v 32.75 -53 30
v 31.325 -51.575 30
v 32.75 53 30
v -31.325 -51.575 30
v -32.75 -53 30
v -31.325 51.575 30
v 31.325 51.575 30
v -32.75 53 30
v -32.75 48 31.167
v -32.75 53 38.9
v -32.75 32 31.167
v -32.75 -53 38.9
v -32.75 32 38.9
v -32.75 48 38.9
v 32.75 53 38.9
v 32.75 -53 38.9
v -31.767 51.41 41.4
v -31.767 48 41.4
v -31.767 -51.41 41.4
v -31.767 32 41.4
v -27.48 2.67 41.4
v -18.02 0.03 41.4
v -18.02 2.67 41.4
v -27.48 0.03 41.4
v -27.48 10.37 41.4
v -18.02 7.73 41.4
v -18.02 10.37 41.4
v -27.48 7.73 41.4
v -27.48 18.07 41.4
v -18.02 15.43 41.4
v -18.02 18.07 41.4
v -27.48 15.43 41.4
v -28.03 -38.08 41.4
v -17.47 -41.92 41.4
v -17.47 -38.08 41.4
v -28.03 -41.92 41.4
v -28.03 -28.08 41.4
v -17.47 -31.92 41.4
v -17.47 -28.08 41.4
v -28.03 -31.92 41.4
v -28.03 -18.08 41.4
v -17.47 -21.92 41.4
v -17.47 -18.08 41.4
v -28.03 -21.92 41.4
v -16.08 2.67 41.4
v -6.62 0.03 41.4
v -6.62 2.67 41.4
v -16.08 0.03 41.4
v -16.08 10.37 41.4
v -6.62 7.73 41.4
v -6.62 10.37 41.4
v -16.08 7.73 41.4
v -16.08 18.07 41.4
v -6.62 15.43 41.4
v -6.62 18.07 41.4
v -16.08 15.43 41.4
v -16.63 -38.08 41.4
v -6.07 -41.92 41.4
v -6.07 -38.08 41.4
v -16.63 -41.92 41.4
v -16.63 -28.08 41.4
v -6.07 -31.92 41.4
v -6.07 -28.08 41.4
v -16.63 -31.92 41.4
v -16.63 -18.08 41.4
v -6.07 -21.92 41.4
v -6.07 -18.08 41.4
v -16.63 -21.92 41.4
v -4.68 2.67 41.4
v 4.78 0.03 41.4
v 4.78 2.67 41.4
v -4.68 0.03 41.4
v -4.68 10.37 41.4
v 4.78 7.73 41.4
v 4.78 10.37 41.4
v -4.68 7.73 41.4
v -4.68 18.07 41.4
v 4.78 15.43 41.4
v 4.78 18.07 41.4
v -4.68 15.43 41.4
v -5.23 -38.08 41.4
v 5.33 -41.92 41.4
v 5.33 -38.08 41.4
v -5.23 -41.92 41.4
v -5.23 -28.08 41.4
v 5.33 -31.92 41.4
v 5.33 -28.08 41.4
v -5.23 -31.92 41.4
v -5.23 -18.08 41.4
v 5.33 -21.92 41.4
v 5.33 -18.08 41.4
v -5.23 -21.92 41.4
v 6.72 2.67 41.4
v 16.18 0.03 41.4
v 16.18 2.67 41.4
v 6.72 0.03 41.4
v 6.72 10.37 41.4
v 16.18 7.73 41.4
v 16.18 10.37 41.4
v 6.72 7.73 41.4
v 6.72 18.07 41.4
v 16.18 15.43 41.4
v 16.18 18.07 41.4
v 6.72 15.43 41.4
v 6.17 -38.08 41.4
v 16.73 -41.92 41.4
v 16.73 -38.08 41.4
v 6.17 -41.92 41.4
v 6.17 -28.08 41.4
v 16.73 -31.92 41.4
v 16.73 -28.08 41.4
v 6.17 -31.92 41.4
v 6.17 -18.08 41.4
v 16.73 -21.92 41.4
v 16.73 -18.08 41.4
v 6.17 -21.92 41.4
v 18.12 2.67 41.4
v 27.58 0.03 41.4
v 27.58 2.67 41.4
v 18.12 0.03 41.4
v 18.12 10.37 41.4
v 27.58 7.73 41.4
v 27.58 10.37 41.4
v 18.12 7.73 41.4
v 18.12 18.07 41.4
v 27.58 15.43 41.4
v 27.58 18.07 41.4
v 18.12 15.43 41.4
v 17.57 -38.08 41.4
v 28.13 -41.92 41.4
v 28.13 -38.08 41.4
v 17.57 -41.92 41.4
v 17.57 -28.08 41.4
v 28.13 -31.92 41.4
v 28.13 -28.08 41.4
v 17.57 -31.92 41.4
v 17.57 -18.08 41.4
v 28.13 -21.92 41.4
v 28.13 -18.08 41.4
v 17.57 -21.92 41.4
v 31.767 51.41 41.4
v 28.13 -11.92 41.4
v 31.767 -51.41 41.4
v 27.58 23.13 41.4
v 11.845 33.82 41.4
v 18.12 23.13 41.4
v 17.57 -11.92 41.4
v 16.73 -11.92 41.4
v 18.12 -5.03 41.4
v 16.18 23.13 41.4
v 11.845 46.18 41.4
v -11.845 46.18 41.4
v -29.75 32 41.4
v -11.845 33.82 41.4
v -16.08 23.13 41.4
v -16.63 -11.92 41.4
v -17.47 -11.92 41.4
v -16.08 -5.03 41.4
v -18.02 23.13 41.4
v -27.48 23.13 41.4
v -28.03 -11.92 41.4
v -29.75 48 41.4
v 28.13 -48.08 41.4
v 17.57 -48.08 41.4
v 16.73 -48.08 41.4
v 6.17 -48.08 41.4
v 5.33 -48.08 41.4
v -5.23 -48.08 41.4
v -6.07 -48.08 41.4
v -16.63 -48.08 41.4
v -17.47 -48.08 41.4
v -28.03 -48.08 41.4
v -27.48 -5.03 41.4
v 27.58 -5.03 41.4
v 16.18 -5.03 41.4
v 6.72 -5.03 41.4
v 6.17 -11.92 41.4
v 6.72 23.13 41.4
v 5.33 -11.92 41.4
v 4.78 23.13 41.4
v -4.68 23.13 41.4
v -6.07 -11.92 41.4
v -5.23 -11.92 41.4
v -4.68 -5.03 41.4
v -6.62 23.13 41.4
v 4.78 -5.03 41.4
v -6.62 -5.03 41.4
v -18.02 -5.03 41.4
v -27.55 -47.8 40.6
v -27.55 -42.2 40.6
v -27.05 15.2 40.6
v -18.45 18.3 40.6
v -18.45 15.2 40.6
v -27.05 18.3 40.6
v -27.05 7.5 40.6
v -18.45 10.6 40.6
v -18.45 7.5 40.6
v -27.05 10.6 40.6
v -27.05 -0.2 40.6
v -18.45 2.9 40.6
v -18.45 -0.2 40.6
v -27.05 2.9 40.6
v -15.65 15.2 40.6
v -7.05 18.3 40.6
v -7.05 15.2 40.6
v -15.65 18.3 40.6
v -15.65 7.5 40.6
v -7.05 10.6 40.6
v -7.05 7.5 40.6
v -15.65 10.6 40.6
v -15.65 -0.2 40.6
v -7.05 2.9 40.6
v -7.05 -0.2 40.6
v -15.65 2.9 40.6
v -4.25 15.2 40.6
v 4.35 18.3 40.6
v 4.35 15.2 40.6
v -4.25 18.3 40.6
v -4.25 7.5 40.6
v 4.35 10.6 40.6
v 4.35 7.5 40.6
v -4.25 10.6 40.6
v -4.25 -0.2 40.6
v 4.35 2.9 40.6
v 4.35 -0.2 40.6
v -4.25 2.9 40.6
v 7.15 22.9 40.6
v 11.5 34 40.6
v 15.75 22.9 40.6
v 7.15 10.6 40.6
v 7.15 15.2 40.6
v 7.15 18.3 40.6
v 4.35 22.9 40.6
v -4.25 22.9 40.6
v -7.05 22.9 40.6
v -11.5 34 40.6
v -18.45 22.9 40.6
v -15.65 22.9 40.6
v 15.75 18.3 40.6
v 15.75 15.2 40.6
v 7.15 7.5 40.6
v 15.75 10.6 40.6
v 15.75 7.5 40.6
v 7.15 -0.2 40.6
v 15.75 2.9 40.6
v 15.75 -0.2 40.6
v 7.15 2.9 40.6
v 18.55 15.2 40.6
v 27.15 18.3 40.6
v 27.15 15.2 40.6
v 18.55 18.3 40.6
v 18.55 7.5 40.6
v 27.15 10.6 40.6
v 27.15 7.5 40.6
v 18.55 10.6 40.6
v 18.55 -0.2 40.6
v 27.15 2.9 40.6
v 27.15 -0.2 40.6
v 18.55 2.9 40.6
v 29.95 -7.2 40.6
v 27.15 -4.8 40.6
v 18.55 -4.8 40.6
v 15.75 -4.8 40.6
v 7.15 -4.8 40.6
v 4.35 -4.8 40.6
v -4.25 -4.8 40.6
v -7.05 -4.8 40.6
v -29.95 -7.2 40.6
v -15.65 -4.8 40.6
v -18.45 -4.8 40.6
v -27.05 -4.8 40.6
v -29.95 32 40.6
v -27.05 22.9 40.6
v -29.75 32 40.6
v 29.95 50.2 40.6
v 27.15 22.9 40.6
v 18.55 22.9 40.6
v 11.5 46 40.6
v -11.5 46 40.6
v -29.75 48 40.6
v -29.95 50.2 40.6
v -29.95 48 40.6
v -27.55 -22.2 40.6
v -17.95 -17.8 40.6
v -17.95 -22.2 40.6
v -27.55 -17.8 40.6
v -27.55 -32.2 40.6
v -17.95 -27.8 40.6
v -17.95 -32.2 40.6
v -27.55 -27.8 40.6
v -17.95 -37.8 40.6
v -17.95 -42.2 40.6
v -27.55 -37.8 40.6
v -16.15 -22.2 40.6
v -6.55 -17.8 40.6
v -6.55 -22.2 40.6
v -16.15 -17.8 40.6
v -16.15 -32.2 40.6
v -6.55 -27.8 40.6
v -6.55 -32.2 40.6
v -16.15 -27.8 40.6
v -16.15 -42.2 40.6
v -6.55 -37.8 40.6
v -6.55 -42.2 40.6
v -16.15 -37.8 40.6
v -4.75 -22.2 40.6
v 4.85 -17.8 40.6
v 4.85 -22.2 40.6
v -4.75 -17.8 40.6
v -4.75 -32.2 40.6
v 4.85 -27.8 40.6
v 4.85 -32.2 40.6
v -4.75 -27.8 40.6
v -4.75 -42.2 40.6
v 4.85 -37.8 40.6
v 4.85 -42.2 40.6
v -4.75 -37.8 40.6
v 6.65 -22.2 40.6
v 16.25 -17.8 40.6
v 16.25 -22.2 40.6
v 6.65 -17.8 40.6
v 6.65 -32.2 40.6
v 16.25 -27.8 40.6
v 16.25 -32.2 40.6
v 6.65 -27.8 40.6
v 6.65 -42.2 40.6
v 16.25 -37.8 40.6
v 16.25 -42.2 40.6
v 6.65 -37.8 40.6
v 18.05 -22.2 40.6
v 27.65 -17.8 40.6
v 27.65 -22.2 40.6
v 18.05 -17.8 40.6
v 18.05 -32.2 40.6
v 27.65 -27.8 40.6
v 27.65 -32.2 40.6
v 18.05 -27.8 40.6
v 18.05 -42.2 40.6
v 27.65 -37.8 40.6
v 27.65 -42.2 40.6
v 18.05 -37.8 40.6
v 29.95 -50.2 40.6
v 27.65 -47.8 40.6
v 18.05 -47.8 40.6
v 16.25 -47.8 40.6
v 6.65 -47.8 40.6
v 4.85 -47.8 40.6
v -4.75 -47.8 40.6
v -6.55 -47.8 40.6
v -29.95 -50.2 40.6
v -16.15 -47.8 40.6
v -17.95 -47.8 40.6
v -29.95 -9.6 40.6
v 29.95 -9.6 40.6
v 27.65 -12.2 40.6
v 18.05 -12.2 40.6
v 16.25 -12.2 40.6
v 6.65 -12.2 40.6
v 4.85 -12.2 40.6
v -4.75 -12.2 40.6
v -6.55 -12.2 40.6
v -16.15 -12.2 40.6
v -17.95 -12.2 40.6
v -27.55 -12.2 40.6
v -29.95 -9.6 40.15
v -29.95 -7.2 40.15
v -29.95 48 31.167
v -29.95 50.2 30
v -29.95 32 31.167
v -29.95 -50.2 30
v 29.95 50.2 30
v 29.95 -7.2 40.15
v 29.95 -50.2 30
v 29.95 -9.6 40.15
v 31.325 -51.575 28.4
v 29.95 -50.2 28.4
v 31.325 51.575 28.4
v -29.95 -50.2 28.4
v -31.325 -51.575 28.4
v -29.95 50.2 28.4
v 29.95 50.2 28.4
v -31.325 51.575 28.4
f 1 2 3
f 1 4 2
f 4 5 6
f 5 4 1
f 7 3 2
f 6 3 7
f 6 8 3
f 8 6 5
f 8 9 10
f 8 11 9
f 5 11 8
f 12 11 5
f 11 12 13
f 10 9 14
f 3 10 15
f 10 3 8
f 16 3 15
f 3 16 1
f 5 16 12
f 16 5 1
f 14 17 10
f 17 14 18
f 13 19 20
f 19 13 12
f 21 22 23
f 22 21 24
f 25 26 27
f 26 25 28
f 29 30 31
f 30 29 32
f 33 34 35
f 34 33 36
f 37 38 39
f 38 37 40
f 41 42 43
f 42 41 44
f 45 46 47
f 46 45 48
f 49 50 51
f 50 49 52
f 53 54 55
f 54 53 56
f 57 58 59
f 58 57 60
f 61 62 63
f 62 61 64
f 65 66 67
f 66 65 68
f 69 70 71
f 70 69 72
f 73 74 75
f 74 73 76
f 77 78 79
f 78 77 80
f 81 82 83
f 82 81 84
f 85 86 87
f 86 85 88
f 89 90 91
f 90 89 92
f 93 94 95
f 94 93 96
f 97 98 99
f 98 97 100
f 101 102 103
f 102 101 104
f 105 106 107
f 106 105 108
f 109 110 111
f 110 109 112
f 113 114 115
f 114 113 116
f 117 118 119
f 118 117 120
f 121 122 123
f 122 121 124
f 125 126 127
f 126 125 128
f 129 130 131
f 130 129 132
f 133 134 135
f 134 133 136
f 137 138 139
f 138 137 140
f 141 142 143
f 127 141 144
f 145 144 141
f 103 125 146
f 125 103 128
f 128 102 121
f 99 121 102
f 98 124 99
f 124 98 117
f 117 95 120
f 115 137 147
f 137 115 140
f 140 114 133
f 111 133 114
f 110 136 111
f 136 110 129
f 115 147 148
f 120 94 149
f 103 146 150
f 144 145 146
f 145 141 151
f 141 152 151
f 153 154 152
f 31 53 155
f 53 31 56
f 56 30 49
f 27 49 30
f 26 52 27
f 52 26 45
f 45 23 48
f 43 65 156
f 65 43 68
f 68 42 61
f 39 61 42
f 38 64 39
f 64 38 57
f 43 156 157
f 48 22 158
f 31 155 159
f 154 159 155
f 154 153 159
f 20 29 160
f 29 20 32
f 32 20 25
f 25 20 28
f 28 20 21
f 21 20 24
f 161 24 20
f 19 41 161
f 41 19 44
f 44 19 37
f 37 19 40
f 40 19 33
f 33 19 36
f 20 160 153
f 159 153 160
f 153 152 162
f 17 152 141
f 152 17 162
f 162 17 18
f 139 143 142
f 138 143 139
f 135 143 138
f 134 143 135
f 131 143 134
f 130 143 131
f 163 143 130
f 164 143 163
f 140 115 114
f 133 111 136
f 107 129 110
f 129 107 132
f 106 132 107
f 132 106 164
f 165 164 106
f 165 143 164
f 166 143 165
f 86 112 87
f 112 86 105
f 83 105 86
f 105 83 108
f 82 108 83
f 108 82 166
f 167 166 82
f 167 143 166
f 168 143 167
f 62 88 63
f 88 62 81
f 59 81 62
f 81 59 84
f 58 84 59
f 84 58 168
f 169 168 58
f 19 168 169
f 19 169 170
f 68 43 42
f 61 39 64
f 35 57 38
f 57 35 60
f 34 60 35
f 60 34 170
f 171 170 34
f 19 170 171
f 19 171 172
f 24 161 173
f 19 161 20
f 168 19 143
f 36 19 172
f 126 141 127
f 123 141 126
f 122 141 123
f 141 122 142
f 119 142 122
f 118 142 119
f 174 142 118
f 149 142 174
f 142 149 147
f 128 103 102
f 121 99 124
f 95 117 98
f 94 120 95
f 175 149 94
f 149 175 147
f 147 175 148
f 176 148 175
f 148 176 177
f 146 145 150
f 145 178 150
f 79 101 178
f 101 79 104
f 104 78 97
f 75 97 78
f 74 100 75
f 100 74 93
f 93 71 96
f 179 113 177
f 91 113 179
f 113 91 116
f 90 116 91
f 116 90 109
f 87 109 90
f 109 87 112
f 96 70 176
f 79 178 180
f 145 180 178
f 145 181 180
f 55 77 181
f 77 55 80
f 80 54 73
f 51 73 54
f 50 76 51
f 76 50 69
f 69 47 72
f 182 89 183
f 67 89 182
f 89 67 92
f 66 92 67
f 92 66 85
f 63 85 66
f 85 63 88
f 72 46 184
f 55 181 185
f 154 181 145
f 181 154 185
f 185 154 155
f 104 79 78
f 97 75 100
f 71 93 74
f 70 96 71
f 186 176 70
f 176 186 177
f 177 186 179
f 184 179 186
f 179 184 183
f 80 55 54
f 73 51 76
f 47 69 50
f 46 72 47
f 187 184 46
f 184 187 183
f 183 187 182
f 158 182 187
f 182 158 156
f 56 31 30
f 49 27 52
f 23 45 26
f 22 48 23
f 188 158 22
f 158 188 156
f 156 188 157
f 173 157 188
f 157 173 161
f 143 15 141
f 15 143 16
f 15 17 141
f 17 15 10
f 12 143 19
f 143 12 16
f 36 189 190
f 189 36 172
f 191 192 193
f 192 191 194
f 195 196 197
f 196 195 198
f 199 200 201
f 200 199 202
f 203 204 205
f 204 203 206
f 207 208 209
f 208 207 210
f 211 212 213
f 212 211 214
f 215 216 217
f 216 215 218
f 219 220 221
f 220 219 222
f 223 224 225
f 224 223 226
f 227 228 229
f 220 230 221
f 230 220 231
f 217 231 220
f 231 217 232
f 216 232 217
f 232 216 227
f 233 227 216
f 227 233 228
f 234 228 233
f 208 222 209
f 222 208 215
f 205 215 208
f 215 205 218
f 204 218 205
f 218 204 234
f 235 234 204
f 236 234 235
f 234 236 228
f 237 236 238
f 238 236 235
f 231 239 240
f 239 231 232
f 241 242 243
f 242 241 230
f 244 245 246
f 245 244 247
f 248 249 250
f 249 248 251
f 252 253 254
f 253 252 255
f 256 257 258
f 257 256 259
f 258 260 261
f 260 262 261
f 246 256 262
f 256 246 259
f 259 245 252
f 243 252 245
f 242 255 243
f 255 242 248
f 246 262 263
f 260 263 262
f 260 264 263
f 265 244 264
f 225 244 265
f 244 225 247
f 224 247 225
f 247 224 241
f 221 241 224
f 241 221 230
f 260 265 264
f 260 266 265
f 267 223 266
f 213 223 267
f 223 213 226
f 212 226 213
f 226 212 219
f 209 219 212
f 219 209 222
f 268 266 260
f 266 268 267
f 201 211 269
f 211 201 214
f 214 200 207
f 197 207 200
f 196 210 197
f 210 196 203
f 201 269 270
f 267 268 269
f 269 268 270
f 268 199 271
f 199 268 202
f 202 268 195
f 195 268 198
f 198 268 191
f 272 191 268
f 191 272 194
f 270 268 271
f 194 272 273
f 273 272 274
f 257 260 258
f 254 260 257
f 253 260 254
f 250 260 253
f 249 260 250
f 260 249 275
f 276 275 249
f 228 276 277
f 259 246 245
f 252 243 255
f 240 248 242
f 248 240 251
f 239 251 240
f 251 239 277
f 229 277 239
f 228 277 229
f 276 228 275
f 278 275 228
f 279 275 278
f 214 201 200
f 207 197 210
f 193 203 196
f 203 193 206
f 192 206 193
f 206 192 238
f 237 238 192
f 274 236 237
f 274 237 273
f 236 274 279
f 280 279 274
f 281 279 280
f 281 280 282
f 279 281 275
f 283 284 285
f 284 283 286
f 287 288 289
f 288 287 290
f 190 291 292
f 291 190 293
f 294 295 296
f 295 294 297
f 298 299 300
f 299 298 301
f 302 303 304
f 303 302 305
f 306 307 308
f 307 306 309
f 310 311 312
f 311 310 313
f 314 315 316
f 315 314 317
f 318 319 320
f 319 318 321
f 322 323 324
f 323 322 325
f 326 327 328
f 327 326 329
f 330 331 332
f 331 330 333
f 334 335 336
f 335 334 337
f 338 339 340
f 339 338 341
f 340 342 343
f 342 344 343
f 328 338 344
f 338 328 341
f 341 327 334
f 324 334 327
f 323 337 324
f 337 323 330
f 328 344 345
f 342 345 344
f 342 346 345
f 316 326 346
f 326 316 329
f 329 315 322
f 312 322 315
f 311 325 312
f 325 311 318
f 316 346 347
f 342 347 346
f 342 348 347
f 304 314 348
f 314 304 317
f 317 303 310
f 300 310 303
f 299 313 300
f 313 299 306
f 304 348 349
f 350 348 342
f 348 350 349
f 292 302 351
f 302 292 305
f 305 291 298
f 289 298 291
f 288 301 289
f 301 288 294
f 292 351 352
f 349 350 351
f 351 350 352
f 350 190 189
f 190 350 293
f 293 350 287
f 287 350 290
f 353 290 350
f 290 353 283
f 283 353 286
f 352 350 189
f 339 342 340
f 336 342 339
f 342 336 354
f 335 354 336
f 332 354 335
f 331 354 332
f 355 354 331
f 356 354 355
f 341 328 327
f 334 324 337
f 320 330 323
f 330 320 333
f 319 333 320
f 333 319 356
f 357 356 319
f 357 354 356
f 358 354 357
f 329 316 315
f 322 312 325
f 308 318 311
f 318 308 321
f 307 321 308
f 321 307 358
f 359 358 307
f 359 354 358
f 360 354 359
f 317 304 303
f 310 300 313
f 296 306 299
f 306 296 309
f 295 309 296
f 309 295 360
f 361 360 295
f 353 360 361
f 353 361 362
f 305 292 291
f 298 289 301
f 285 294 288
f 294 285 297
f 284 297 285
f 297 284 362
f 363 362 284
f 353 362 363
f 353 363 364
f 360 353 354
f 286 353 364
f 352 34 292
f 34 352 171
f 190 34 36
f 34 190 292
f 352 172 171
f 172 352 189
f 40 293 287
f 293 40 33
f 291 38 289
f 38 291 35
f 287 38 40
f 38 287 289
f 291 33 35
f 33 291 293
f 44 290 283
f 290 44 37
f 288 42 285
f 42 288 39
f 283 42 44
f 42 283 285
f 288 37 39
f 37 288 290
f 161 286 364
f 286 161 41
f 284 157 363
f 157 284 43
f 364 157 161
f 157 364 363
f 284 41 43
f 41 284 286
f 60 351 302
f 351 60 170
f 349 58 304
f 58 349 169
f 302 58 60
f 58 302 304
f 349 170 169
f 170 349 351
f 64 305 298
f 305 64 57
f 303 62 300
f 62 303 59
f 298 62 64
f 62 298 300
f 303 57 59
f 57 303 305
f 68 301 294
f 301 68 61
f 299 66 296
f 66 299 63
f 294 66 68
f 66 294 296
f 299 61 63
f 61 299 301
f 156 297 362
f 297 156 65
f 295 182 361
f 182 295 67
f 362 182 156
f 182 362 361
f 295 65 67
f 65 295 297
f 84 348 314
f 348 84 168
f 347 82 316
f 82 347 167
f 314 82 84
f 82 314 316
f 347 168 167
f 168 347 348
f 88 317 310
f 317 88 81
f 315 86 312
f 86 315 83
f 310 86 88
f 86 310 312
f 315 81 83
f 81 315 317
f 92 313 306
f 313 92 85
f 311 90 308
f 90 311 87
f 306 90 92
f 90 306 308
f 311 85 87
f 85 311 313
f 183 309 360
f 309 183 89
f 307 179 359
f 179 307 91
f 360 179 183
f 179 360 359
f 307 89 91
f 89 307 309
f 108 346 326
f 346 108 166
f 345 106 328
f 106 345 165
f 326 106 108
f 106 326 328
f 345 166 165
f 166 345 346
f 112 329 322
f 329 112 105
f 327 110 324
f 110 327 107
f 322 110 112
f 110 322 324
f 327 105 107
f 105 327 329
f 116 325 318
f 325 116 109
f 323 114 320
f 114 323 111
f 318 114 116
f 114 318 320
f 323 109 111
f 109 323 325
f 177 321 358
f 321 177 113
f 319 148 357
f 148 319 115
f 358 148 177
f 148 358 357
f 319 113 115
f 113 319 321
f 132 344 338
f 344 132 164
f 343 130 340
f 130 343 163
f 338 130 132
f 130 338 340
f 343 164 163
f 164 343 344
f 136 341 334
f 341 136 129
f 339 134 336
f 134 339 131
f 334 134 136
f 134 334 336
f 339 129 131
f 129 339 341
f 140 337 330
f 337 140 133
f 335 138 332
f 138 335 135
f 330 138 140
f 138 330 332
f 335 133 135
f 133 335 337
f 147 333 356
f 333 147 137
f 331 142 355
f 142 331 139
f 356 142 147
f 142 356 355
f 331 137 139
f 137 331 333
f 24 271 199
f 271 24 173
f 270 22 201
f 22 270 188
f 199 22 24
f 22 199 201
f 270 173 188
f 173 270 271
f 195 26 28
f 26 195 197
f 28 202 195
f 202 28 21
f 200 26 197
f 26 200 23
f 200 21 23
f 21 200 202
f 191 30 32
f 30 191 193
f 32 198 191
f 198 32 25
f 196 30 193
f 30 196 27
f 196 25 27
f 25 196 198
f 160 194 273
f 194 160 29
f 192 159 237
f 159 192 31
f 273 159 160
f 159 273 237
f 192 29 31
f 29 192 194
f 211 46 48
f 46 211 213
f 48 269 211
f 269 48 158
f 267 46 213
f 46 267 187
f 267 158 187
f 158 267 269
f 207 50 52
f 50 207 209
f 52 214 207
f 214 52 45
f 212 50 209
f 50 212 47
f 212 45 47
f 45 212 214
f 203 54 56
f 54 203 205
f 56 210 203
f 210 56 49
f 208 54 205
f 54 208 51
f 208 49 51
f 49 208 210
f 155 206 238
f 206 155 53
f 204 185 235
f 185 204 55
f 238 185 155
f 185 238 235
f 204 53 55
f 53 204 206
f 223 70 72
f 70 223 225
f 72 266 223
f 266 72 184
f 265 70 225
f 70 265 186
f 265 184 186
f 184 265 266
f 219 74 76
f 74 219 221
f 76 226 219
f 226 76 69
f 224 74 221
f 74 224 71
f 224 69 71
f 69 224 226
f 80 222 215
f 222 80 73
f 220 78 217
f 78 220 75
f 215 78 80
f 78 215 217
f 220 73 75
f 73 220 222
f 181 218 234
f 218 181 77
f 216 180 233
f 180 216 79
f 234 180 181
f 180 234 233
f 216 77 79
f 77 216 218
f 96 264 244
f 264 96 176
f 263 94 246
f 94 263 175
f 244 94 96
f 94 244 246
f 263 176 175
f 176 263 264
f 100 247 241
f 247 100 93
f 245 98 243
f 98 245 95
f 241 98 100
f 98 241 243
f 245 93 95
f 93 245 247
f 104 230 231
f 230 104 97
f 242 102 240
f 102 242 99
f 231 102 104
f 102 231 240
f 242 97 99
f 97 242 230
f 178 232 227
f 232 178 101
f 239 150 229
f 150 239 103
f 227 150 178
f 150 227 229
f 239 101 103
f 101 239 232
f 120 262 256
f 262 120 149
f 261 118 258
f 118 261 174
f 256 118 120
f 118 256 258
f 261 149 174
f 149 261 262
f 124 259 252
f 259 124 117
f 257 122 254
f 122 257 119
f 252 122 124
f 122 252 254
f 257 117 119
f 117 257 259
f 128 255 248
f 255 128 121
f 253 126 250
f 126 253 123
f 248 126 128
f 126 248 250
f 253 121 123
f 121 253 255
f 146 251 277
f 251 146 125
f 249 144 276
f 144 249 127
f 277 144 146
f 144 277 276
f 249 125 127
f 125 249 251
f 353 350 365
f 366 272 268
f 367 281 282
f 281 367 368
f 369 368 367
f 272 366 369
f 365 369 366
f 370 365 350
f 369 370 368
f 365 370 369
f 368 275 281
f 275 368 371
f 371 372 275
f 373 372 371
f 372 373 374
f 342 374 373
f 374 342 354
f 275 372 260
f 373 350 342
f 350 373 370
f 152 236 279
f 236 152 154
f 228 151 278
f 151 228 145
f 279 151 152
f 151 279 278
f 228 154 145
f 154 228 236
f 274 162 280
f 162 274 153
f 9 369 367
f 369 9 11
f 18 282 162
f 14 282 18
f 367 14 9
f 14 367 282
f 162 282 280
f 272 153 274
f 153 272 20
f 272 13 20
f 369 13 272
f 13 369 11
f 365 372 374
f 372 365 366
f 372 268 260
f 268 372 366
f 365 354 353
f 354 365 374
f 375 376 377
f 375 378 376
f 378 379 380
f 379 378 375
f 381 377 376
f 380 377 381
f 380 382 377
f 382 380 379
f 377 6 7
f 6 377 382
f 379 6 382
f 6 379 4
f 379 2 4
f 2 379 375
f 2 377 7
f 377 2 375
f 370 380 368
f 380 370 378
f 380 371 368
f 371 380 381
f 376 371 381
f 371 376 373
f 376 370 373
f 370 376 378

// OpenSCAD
// Thickness values for the case elements
pcb_thickness = 7;       // PCB thickness
lcd_thickness = 2.6;       // LCD thickness needed for border around screen
battery_thickness = 5.5;   // Tallest element on the back of the PCB is battery holder

// Thickness values for elements of keyboard spacer
switch_thickness = 2.0; 
pusher_thickness = 0.6;       
spacer_spring_thickness = 0.2;

// Thickness values for elements of keypad
keypad_thickness = 0.6; 
keypad_spring_thickness = 0.4; // Optionally can make flat spring thinner than keypad
keypad_tolerance = 0.4;        // Gap between keypad and case top

face_thickness = 0.8; 
back_thickness = 0.8; 
chamfer_thickness = 2.5; 
wall_width = 3.0; 
joint_thickness = 1.6; 
joint_width = 1.4; 
joint_tolerance = 0.05; 

pcb_width = 59.5; 
pcb_height = 100;
pcb_tolerance = 0.2; 

keypad_large_row = 5; // Distance from bottom PCB edge to the  
                        // center of 1st (bottom) row of large keys
keypad_small_row = 47.5; // Distance from bottom PCB edge to the  
                        // center of 1st (bottom) row of small keys

// Derived dimensions
spacer_thickness = switch_thickness + pusher_thickness; 
keyboard_thickness = spacer_thickness + keypad_thickness + keypad_tolerance; 

top_thickness = pcb_thickness + keyboard_thickness + face_thickness; 
bottom_thickness = battery_thickness + back_thickness; 
tot_thickness = top_thickness + bottom_thickness; 
tot_width = pcb_width + 2*wall_width; 
tot_height = pcb_height + 2*wall_width; 

keyb_left = 5.75; //keyboard left

module top_half() {
    difference() {
        union() {
            linear_extrude(height = top_thickness-chamfer_thickness) {
                square([tot_width, tot_height], center = true); 
            }
            translate([0, 0, top_thickness-chamfer_thickness]) {
                linear_extrude(height = chamfer_thickness, scale = 0.97) {
                    square([tot_width, tot_height], center = true); 
                }
            }
        }

        linear_extrude(height = pcb_thickness + keyboard_thickness) {
            square([pcb_width + 2*pcb_tolerance, pcb_height + 2*pcb_tolerance], 
                       center = true); 
        }

        // Cut-outs for large keys
        union() { 
            for (i=[0:4]) {
                for (j=[0:3]) {
                   translate([11.4*(i-2.5)+keyb_left, 10*j-pcb_height/2.+keypad_large_row, 
                              pcb_thickness + keyboard_thickness]) 
//                        cube([9.6, 5.6, 10], center = true); 
                        linear_extrude(height = face_thickness, scale = 1.1) 
                            square([9.6, 5.6], center = true); 

                }
            }
        }

        // Cut-outs for small keys
        union() { 
            for (i=[0:4]) {
                for (j=[0:3]) {
                   translate([11.4*(i-2.5)+keyb_left, 
                        7.7*j-pcb_height/2.+keypad_small_row, 
                        pcb_thickness + keyboard_thickness]) 
//                        cube([8.6, 4.6, 10], center = true); 
                        linear_extrude(height = face_thickness, scale = 1.1) 
                            square([8.6, 4.6], center = true); 

                }
            }
        }
        
        // Cut-out for display
        translate([0, pcb_height/2.-20/2., pcb_thickness + keyboard_thickness]) 
          linear_extrude(height = face_thickness, scale = 1.03) 
            square([23, 12], center = true); 
        
        
//katse eksituse meetodil leitud auk programmeerimiskaabli jaoks:       
       translate([-pcb_width/2.-13, 32, pcb_thickness/6.]) 
            cube([13, 16, pcb_thickness*2], center = false);  
        
    }

    // Supporting edge between display and keyboard (vahejoon)
    translate([0, pcb_height/2.-58.4, pcb_thickness + keyboard_thickness]) 
      cube([pcb_width+2*pcb_tolerance, 2.4, keyboard_thickness/4], 
           center = true);     

    // Joint around PCB
    translate([0, 0, -joint_thickness]) 
    difference() {
      linear_extrude(height = joint_thickness) {
        difference() {
            square([pcb_width + 2*pcb_tolerance+2*joint_width-joint_tolerance, 
                    pcb_height + 2*pcb_tolerance + 2*joint_width-joint_tolerance], center = true); 
            square([pcb_width + 2*pcb_tolerance, 
                    pcb_height + 2*pcb_tolerance], center = true); 
        }
      }
      // Cut-out for display cable
//      translate([0, pcb_height/2., pcb_thickness/2.]) 
//                  cube([12, 2, pcb_thickness*2], center = true); 
    }
}; 
    
module bottom_half() {
    difference() {
        union() {
            linear_extrude(height = bottom_thickness - chamfer_thickness) {
                square([tot_width, tot_height], center = true); 
            }
            translate([0, 0, bottom_thickness - chamfer_thickness]) {
                linear_extrude(height = chamfer_thickness, scale = 0.97) {
                    square([tot_width, tot_height], center = true); 
                }
            }
        }
        linear_extrude(height = battery_thickness) {
                square([pcb_width+2*pcb_tolerance, pcb_height+2*pcb_tolerance], 
                   center = true); 
        }

      // Joint around PCB
      translate([0, 0, 0]) 
        linear_extrude(height = joint_thickness) {
          difference() {
            square([pcb_width + 2*pcb_tolerance+2*joint_width + joint_tolerance, 
                    pcb_height + 2*pcb_tolerance + 2*joint_width + joint_tolerance], center = true); 
            square([pcb_width + 2*pcb_tolerance, 
                    pcb_height + 2*pcb_tolerance], center = true); 
          }
        }

    translate([-pcb_width/3, pcb_height/2. + pcb_tolerance + joint_width-0.2 + joint_tolerance, joint_thickness-0.4]) rotate(a = [0, 90, 0]) cylinder(17, r=0.4, $fn=16, center = true); 
    translate([+pcb_width/3, pcb_height/2. + pcb_tolerance + joint_width-0.2 + joint_tolerance, joint_thickness-0.4]) rotate(a = [0, 90, 0]) cylinder(17, r=0.4, $fn=16, center = true); 
    translate([-pcb_width/3, -pcb_height/2. - pcb_tolerance - joint_width+0.2 - joint_tolerance, joint_thickness-0.4]) rotate(a = [0, 90, 0]) cylinder(17, r=0.4, $fn=16, center = true); 
    translate([+pcb_width/3, -pcb_height/2. - pcb_tolerance - joint_width+0.2 - joint_tolerance, joint_thickness-0.4]) rotate(a = [0, 90, 0]) cylinder(17, r=0.4, $fn=16, center = true); 
    translate([-pcb_width/2 - pcb_tolerance - joint_width+0.2- joint_tolerance, pcb_height/3., joint_thickness-0.4]) rotate(a = [90, 0, 0]) cylinder(17, r=0.4, $fn=16, center = true); 
    translate([-pcb_width/2 - pcb_tolerance - joint_width+0.2- joint_tolerance, -pcb_height/3., joint_thickness-0.4]) rotate(a = [90, 0, 0]) cylinder(17, r=0.4, $fn=16, center = true); 
    translate([ pcb_width/2 + pcb_tolerance + joint_width-0.2+joint_tolerance, pcb_height/3., joint_thickness-0.4]) rotate(a = [90, 0, 0]) cylinder(17, r=0.4, $fn=16, center = true); 
    translate([ pcb_width/2 + pcb_tolerance + joint_width-0.2+joint_tolerance, -pcb_height/3., joint_thickness-0.4]) rotate(a = [90, 0, 0]) cylinder(17, r=0.4, $fn=16, center = true); 
    translate([-pcb_width/2 - pcb_tolerance - joint_width+0.2-joint_tolerance, 0, joint_thickness-0.4]) rotate(a = [90, 0, 0]) cylinder(17, r=0.4, $fn=16, center = true); 
    translate([ pcb_width/2 + pcb_tolerance + joint_width-0.2+joint_tolerance, 0, joint_thickness-0.4]) rotate(a = [90, 0, 0]) cylinder(17, r=0.4, $fn=16, center = true); 


    }
    
//    for (i=[0:3]) {
//      translate([0, 10-i*65/3., battery_thickness/2.]) cube([pcb_width, 3, battery_thickness], center = true);
//    }
    
//    translate([-pcb_width/2.+3/2., pcb_height/4., battery_thickness/2.]) cube([3, pcb_height/3., battery_thickness], center = true);
}; 

module large_key(s) {
  translate([0, 0, keypad_thickness/2]) {
    difference() {
      cube([12, 11, keypad_thickness], center = true); 
      cube([11.2,  8, keypad_thickness ], center = true); 
    }
  }; 
  translate([-2.5, -4, 0]) cube([5, 1, keypad_spring_thickness]); 
  translate([0, 0, keypad_thickness/2.]) cube([10,  6, keypad_thickness ], center = true); 
  difference() {
    linear_extrude(height = 2.2, scale = 0.85) square([9.2, 5.2], center = true); 
    //translate([0, 0, 3/2.]) cube([9, 5, 3 ], center = true); 
    translate([0, 0, 2.4]) {
        linear_extrude(height = 0.8) {
            text(s, font = "Liberation Sans:style=Bold", size = 3, halign = "center"        , valign = "center");
        }
    }
  }
}

module small_key(s) {
  translate([0, 0, 0.6/2]) {
    difference() {
      cube([12, 8.6, 0.6], center = true); 
      cube([10,  7.0, 1. ], center = true); 
    }
  }; 
  translate([-2., -3.5, 0]) cube([4, 1, 0.4]); 
  translate([0, 0, 0.6/2.]) cube([9., 5.5, 0.6 ], center = true); 
  difference() {
    linear_extrude(height = 2.2, scale = 0.9) square([8.2, 4.2], 
      center = true); 
    //translate([0, 0, 3/2.]) cube([9, 5, 3 ], center = true); 
    translate([0, 0, 2.2]) {
        linear_extrude(height = 0.8) {
            text(s, font = "Liberation Sans:style=Bold", size = 2.4, halign = "center"        , valign = "center");
        }
    }
  }
}

module large_keypad() {

  labels = [
  "0", "/-/", ".", "+/-", "Ent", 
  "1", "2", "3", "+", "-", 
  "4", "5", "6", "*", "/", 
  "7", "8", "9", "E", "C"
  ]; 

  for (i=[0:4]) {
    for (j=[0:3]) {
      translate([11.4*(i-2), 10*j-pcb_height/2.+keypad_large_row, 
              pcb_thickness + spacer_thickness]) 
//        large_key(labels[5*j+i]); 
        large_key(""); 
    }
  }

}


module small_keypad() {

  labels = [
  "Erf", "Sqrt", "Pol", "1/x", "Drp", "X-Y", 
  "y^x", "ln", "lg", "sin", "cos", "tan", 
  "", "", "R-G", "M+", "MR", "MS", 
  "F", "G", "Mod", "Unc", "Prc", "On"
  ]; 

  for (i=[0:4]) {
    for (j=[0:3]) {
      translate([11.4*(i-2.5)+keyb_left, 7.7*j-pcb_height/2.+keypad_small_row, 
               pcb_thickness + spacer_thickness]) 
//        small_key(labels[6*j+i]); 
        small_key(""); 
    }
  }
  
  // Additional width on left and right
//  translate([pcb_width/2.-0.5, -8.6/2.-pcb_height/2.+keypad_small_row, 
//               pcb_thickness + spacer_thickness]) 
//    cube([0.5, 7.7*4 + 8.6-7.7, 0.6]); 
//  
//  translate([-pcb_width/2., -8.6/2.-pcb_height/2.+keypad_small_row, 
//               pcb_thickness + spacer_thickness]) 
//    cube([0.5, 7.7*4 + 8.6-7.7, 0.6]); 
  
}

module keypad() {

  large_keypad(); 
  small_keypad(); 

  // Connection between two keypads
//  translate([0., 10*4-pcb_height/2.+4.6, pcb_thickness + spacer_thickness + 0.6/2.]) cube([pcb_width, 2.2, 0.6], center = true); 
}

module large_spacer_element() {
  
    difference() {
      cube([14, 10, spacer_thickness], center = true); 
      cube([11, 7, spacer_thickness], center = true); 
    }
    translate([0, 0, spacer_thickness/2-pusher_thickness/2]) 
//      cube([3.2, 2.6, pusher_thickness], center = true); 
      cylinder(pusher_thickness, r = 1.6, center = true, $fn = 16);
    translate([0, -2.5, spacer_thickness/2-spacer_spring_thickness/2])  
      cube([3.0, 5, spacer_spring_thickness], center = true); 
}

module small_spacer_element() {
  
    difference() {
      cube([13, 8.6, spacer_thickness], center = true); 
      cube([10, 6.5, spacer_thickness], center = true); 
    }
    translate([0, 0, spacer_thickness/2-pusher_thickness/2]) 
//      cube([3.2, 2.6, pusher_thickness], center = true); 
      cylinder(pusher_thickness, r = 1.6, center = true, $fn = 16);
    translate([0, -8.6/4., spacer_thickness/2-spacer_spring_thickness/2])  
      cube([3.0, 8.6/2., spacer_spring_thickness], center = true); 
}

module spacer() {

//large
  for (i=[0:4]) {
    for (j=[0:3]) {
      translate([11.4*(i-2.5)+keyb_left, 10*j-pcb_height/2.+keypad_large_row, 
              pcb_thickness + spacer_thickness/2.]) 
        large_spacer_element(); 
    }
  }

//small
  for (i=[0:4]) {
    for (j=[0:3]) {
      translate([11.4*(i-2.5)+keyb_left, 7.7*j-pcb_height/2.+keypad_small_row, 
               pcb_thickness + spacer_thickness/2.]) 
        small_spacer_element(); 
    }
  }

//  translate([0, -18.9, pcb_thickness + spacer_thickness/2.]) 
//    cube([pcb_width, 2.2, spacer_thickness], center = true); 
}


// Tests 
//translate([0., 5.,  spacer_thickness/2.]) mirror([0,0,1]) small_spacer_element(); 
//translate([0., -5., 0]) small_key("y^x"); 



// Finally, make all parts
// Comment out if needed

//translate([0., 0., 0]) spacer(); 

//translate([0., 0., 10]) keypad();   

translate([0., 0., 30]) top_half(); 

//translate([0., 0., -10]) mirror([0,0,1]) bottom_half(); 

//cube([1, 1, 1], center = true); // Dummy cube for "mouse ears" in slicer
